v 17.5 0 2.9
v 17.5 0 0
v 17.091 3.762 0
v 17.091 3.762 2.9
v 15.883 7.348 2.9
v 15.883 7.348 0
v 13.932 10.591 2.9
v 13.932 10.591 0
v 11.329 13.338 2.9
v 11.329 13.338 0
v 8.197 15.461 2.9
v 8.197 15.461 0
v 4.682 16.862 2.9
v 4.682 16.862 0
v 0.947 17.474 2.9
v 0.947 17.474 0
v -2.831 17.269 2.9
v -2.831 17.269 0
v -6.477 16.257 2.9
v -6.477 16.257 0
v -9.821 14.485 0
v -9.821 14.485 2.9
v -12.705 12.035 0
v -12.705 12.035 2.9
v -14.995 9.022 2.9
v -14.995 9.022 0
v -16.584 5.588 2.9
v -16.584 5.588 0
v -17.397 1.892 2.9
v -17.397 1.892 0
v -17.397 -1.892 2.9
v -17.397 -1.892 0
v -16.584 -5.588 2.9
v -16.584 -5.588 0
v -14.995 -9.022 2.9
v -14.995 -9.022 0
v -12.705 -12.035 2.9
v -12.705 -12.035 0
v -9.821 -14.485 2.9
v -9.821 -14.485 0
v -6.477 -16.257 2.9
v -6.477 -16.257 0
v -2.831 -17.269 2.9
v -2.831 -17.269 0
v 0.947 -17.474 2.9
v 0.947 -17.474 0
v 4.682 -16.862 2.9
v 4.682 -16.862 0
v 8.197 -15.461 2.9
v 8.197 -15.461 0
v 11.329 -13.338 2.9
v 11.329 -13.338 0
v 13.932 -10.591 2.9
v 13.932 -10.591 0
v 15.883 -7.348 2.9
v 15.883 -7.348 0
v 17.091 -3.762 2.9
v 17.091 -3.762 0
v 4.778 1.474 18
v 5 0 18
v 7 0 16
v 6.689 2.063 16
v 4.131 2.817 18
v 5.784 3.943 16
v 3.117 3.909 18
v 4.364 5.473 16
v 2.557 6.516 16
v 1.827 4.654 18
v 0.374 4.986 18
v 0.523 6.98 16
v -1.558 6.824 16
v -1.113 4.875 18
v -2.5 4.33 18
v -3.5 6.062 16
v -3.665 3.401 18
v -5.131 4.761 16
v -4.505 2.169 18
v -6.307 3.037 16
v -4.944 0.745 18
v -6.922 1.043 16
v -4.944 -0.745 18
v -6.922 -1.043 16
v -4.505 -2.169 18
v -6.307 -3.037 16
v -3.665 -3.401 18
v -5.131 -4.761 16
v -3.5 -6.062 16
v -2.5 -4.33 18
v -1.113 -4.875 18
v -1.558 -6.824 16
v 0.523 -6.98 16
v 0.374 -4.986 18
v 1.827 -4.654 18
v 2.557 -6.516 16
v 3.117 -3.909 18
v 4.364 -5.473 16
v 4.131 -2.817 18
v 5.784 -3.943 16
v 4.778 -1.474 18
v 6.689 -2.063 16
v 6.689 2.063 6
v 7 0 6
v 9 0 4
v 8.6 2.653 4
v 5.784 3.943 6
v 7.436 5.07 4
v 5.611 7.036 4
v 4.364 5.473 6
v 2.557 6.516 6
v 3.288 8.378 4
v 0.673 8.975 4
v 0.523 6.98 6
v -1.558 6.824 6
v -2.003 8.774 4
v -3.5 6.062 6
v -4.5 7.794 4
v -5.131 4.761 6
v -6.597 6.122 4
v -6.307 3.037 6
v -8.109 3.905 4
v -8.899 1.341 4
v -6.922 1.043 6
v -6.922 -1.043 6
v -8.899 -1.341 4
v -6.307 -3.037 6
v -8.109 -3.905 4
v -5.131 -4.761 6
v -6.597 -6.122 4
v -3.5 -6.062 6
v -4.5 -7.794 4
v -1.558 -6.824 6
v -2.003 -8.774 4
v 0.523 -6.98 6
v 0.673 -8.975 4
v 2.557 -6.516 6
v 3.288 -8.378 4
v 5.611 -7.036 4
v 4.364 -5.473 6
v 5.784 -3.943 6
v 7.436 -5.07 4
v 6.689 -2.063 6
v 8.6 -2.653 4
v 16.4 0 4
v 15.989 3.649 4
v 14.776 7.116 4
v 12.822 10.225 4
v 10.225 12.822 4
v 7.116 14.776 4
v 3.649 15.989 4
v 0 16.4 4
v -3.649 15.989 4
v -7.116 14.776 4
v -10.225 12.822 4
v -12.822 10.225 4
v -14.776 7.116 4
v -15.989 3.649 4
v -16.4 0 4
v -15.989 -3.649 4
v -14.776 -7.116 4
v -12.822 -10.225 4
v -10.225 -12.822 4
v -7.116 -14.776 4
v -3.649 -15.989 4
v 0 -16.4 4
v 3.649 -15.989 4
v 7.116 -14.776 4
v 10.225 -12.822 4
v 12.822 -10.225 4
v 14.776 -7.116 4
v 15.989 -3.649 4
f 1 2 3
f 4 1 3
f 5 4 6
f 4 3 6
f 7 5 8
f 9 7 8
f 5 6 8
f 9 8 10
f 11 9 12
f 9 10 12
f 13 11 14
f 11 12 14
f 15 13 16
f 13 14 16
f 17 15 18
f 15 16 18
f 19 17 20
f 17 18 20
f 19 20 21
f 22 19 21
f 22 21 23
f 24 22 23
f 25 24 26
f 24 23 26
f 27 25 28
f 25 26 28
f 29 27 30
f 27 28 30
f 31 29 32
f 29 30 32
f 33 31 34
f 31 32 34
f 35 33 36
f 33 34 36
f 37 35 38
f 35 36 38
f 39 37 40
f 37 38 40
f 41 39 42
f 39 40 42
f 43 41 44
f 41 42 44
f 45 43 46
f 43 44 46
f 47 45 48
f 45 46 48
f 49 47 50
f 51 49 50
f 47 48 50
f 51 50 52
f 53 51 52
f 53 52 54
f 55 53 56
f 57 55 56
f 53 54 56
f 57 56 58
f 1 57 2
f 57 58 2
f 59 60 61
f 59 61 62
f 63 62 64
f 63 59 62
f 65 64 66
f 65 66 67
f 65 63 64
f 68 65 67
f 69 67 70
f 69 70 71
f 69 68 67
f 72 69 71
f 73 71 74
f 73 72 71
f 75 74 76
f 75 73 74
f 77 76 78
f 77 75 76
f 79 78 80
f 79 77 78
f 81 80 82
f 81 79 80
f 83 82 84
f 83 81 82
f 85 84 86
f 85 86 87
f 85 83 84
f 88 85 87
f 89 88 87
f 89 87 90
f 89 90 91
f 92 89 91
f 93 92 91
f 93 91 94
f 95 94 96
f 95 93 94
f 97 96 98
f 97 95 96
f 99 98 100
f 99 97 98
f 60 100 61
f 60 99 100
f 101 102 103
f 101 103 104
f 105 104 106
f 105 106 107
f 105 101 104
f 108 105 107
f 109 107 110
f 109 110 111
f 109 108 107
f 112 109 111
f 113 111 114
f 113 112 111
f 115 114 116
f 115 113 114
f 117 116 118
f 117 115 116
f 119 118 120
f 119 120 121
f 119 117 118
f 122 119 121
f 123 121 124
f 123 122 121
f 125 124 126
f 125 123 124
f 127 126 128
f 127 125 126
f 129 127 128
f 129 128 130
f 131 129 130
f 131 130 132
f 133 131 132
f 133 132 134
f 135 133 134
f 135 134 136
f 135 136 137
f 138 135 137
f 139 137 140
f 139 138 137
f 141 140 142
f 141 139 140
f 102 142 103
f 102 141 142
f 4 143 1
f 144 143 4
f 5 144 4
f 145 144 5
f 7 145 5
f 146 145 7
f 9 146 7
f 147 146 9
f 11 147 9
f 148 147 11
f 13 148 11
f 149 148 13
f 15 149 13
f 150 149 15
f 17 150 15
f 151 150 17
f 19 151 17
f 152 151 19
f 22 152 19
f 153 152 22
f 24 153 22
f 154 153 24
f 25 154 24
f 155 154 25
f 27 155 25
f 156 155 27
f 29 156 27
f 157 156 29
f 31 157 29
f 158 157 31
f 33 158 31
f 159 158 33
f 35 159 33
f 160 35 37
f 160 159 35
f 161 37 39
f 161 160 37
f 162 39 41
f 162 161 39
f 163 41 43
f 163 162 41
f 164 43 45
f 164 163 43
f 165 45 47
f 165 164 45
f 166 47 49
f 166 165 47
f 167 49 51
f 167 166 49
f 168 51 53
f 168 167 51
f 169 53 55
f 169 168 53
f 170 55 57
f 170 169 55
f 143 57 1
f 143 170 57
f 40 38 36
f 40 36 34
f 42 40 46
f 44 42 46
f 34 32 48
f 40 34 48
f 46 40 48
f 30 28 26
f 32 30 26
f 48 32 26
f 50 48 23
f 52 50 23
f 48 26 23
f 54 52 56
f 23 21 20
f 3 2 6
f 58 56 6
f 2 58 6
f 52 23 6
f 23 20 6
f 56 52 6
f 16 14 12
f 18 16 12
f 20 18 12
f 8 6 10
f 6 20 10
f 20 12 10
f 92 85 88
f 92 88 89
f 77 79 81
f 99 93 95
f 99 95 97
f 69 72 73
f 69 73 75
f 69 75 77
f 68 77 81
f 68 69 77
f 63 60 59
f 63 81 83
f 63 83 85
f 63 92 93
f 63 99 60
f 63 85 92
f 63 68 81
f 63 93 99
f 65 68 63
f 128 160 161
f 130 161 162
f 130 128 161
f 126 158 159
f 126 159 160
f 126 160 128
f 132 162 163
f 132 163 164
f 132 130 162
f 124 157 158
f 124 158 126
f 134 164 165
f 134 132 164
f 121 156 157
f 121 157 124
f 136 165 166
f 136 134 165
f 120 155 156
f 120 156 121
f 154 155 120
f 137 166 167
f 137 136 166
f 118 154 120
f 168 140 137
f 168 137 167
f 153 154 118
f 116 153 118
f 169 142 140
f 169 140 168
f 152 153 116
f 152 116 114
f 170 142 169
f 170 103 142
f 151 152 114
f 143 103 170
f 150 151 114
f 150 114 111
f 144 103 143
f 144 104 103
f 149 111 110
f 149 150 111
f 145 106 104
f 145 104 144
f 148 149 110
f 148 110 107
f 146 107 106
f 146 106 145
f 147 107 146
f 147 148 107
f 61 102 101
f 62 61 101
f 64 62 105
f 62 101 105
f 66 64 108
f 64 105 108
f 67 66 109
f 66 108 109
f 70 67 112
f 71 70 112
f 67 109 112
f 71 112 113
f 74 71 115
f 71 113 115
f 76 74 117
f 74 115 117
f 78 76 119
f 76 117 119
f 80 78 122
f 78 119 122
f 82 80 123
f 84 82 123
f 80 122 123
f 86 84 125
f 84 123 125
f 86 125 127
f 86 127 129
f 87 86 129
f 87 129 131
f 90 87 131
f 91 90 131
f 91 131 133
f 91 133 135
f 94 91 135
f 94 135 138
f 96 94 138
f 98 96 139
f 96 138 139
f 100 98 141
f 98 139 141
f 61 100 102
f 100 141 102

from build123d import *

# Parameters (mm, degrees)
F0_R     = 17.5
F1_DEPTH = 4
F2_R     = 7
F3_DEPTH = 14
F4_SIZE  = 1.1
F5_SIZE  = 2


with BuildPart() as f1:
    # F0 (on Top) → F1 (new body)
    with BuildSketch(Plane.XY):
        Circle(F0_R)
    extrude(amount=F1_DEPTH)

    # F2 (on face) → F3 (join)
    with BuildSketch(Plane.XY.offset(4)):
        Circle(F2_R)
    extrude(amount=F3_DEPTH)

    # F4
    f4_edges = [f1.edges().sort_by_distance(p)[0] for p in [
        (-17.5, 0, 4),
    ]]
    chamfer(f4_edges, length=F4_SIZE)

    # F5
    f5_edges = [f1.edges().sort_by_distance(p)[0] for p in [
        (-7, 0, 18),
        (-7, 0, 4),
    ]]
    chamfer(f5_edges, length=F5_SIZE)


solid = f1.part
